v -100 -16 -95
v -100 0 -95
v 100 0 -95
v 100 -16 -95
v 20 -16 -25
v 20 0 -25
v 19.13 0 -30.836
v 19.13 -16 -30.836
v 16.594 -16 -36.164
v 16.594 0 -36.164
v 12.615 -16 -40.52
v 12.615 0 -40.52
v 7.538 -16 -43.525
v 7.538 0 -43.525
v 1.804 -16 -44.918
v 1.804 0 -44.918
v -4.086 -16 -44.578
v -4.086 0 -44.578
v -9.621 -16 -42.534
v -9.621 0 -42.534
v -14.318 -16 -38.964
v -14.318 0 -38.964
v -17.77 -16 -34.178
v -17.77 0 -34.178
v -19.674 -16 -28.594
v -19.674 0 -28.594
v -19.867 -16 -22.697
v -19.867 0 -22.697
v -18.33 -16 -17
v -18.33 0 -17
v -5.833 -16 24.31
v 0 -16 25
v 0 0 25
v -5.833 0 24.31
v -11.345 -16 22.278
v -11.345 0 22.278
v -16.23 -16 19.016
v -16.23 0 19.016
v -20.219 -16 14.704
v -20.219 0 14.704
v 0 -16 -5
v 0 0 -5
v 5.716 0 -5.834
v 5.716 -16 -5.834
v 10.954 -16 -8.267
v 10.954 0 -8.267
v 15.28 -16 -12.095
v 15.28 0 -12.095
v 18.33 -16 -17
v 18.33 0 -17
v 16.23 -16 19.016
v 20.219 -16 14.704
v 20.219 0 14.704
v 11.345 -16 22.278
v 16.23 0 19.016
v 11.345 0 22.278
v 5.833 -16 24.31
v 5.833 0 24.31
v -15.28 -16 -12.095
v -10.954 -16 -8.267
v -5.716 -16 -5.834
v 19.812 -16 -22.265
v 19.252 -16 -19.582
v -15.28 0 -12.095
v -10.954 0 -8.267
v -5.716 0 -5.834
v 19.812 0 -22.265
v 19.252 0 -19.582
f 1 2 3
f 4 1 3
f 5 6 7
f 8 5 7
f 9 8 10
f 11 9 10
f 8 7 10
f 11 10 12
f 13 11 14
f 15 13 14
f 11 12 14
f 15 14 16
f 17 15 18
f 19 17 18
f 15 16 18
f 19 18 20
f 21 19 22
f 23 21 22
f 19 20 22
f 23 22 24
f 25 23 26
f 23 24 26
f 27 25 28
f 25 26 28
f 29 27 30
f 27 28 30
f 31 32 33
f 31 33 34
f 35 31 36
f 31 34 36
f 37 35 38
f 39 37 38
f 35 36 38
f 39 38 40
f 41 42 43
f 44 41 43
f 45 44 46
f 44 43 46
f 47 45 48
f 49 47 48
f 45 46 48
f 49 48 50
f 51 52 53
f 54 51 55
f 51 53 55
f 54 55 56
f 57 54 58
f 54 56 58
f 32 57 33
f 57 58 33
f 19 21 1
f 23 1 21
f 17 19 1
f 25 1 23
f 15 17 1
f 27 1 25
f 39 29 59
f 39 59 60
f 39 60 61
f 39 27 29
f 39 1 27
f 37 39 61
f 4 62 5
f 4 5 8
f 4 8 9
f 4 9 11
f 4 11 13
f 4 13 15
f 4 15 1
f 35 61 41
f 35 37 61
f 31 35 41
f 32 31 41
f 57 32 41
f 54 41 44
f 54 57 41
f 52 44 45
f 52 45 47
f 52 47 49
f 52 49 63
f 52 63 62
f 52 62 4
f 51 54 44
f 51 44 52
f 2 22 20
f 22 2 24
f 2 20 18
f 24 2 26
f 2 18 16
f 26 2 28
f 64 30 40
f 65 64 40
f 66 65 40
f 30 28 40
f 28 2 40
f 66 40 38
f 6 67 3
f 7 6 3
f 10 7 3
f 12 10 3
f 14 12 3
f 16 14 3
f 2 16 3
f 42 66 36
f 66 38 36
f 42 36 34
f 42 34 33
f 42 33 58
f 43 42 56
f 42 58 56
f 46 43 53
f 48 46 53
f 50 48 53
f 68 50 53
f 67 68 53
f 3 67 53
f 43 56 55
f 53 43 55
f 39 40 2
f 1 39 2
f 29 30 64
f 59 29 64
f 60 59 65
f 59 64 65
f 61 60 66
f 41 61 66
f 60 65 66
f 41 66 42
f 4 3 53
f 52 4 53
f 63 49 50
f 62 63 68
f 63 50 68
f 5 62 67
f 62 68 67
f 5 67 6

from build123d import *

# Parameters (mm, degrees)
F1_DEPTH = 16


with BuildPart() as f1:
    # F0 (on Front) → F1 (new body)
    with BuildSketch(Plane.XZ):
        with BuildLine():
            ThreePointArc((18.330303, -17), (23.27292, -9.130784), (25, 0))
            ThreePointArc((25, 0), (23.774644, 7.730867), (20.218695, 14.70389))
            ThreePointArc((20.218695, 14.70389), (11.344663, 22.277761), (0, 25))
            ThreePointArc((0, 25), (-11.344663, 22.277761), (-20.218695, 14.70389))
            ThreePointArc((-20.218695, 14.70389), (-24.95577, -1.486451), (-18.330303, -17))
            ThreePointArc((-18.330303, -17), (-10.954451, -8.266799), (0, -5))
            ThreePointArc((0, -5), (10.954451, -8.266799), (18.330303, -17))
        make_face()
        with BuildLine():
            ThreePointArc((20.218695, 14.70389), (23.774644, 7.730867), (25, 0))
            ThreePointArc((25, 0), (23.27292, -9.130784), (18.330303, -17))
            ThreePointArc((18.330303, -17), (19.578126, -20.913807), (20, -25))
            ThreePointArc((20, -25), (-4.086193, -44.578126), (-18.330303, -17))
            ThreePointArc((-18.330303, -17), (-24.95577, -1.486451), (-20.218695, 14.70389))
            Line((-20.218695, 14.70389), (-100, -95))
            Line((-100, -95), (0, -95))
            Line((0, -95), (100, -95))
            Line((100, -95), (20.218695, 14.70389))
        make_face()
    extrude(amount=F1_DEPTH)


solid = f1.part
